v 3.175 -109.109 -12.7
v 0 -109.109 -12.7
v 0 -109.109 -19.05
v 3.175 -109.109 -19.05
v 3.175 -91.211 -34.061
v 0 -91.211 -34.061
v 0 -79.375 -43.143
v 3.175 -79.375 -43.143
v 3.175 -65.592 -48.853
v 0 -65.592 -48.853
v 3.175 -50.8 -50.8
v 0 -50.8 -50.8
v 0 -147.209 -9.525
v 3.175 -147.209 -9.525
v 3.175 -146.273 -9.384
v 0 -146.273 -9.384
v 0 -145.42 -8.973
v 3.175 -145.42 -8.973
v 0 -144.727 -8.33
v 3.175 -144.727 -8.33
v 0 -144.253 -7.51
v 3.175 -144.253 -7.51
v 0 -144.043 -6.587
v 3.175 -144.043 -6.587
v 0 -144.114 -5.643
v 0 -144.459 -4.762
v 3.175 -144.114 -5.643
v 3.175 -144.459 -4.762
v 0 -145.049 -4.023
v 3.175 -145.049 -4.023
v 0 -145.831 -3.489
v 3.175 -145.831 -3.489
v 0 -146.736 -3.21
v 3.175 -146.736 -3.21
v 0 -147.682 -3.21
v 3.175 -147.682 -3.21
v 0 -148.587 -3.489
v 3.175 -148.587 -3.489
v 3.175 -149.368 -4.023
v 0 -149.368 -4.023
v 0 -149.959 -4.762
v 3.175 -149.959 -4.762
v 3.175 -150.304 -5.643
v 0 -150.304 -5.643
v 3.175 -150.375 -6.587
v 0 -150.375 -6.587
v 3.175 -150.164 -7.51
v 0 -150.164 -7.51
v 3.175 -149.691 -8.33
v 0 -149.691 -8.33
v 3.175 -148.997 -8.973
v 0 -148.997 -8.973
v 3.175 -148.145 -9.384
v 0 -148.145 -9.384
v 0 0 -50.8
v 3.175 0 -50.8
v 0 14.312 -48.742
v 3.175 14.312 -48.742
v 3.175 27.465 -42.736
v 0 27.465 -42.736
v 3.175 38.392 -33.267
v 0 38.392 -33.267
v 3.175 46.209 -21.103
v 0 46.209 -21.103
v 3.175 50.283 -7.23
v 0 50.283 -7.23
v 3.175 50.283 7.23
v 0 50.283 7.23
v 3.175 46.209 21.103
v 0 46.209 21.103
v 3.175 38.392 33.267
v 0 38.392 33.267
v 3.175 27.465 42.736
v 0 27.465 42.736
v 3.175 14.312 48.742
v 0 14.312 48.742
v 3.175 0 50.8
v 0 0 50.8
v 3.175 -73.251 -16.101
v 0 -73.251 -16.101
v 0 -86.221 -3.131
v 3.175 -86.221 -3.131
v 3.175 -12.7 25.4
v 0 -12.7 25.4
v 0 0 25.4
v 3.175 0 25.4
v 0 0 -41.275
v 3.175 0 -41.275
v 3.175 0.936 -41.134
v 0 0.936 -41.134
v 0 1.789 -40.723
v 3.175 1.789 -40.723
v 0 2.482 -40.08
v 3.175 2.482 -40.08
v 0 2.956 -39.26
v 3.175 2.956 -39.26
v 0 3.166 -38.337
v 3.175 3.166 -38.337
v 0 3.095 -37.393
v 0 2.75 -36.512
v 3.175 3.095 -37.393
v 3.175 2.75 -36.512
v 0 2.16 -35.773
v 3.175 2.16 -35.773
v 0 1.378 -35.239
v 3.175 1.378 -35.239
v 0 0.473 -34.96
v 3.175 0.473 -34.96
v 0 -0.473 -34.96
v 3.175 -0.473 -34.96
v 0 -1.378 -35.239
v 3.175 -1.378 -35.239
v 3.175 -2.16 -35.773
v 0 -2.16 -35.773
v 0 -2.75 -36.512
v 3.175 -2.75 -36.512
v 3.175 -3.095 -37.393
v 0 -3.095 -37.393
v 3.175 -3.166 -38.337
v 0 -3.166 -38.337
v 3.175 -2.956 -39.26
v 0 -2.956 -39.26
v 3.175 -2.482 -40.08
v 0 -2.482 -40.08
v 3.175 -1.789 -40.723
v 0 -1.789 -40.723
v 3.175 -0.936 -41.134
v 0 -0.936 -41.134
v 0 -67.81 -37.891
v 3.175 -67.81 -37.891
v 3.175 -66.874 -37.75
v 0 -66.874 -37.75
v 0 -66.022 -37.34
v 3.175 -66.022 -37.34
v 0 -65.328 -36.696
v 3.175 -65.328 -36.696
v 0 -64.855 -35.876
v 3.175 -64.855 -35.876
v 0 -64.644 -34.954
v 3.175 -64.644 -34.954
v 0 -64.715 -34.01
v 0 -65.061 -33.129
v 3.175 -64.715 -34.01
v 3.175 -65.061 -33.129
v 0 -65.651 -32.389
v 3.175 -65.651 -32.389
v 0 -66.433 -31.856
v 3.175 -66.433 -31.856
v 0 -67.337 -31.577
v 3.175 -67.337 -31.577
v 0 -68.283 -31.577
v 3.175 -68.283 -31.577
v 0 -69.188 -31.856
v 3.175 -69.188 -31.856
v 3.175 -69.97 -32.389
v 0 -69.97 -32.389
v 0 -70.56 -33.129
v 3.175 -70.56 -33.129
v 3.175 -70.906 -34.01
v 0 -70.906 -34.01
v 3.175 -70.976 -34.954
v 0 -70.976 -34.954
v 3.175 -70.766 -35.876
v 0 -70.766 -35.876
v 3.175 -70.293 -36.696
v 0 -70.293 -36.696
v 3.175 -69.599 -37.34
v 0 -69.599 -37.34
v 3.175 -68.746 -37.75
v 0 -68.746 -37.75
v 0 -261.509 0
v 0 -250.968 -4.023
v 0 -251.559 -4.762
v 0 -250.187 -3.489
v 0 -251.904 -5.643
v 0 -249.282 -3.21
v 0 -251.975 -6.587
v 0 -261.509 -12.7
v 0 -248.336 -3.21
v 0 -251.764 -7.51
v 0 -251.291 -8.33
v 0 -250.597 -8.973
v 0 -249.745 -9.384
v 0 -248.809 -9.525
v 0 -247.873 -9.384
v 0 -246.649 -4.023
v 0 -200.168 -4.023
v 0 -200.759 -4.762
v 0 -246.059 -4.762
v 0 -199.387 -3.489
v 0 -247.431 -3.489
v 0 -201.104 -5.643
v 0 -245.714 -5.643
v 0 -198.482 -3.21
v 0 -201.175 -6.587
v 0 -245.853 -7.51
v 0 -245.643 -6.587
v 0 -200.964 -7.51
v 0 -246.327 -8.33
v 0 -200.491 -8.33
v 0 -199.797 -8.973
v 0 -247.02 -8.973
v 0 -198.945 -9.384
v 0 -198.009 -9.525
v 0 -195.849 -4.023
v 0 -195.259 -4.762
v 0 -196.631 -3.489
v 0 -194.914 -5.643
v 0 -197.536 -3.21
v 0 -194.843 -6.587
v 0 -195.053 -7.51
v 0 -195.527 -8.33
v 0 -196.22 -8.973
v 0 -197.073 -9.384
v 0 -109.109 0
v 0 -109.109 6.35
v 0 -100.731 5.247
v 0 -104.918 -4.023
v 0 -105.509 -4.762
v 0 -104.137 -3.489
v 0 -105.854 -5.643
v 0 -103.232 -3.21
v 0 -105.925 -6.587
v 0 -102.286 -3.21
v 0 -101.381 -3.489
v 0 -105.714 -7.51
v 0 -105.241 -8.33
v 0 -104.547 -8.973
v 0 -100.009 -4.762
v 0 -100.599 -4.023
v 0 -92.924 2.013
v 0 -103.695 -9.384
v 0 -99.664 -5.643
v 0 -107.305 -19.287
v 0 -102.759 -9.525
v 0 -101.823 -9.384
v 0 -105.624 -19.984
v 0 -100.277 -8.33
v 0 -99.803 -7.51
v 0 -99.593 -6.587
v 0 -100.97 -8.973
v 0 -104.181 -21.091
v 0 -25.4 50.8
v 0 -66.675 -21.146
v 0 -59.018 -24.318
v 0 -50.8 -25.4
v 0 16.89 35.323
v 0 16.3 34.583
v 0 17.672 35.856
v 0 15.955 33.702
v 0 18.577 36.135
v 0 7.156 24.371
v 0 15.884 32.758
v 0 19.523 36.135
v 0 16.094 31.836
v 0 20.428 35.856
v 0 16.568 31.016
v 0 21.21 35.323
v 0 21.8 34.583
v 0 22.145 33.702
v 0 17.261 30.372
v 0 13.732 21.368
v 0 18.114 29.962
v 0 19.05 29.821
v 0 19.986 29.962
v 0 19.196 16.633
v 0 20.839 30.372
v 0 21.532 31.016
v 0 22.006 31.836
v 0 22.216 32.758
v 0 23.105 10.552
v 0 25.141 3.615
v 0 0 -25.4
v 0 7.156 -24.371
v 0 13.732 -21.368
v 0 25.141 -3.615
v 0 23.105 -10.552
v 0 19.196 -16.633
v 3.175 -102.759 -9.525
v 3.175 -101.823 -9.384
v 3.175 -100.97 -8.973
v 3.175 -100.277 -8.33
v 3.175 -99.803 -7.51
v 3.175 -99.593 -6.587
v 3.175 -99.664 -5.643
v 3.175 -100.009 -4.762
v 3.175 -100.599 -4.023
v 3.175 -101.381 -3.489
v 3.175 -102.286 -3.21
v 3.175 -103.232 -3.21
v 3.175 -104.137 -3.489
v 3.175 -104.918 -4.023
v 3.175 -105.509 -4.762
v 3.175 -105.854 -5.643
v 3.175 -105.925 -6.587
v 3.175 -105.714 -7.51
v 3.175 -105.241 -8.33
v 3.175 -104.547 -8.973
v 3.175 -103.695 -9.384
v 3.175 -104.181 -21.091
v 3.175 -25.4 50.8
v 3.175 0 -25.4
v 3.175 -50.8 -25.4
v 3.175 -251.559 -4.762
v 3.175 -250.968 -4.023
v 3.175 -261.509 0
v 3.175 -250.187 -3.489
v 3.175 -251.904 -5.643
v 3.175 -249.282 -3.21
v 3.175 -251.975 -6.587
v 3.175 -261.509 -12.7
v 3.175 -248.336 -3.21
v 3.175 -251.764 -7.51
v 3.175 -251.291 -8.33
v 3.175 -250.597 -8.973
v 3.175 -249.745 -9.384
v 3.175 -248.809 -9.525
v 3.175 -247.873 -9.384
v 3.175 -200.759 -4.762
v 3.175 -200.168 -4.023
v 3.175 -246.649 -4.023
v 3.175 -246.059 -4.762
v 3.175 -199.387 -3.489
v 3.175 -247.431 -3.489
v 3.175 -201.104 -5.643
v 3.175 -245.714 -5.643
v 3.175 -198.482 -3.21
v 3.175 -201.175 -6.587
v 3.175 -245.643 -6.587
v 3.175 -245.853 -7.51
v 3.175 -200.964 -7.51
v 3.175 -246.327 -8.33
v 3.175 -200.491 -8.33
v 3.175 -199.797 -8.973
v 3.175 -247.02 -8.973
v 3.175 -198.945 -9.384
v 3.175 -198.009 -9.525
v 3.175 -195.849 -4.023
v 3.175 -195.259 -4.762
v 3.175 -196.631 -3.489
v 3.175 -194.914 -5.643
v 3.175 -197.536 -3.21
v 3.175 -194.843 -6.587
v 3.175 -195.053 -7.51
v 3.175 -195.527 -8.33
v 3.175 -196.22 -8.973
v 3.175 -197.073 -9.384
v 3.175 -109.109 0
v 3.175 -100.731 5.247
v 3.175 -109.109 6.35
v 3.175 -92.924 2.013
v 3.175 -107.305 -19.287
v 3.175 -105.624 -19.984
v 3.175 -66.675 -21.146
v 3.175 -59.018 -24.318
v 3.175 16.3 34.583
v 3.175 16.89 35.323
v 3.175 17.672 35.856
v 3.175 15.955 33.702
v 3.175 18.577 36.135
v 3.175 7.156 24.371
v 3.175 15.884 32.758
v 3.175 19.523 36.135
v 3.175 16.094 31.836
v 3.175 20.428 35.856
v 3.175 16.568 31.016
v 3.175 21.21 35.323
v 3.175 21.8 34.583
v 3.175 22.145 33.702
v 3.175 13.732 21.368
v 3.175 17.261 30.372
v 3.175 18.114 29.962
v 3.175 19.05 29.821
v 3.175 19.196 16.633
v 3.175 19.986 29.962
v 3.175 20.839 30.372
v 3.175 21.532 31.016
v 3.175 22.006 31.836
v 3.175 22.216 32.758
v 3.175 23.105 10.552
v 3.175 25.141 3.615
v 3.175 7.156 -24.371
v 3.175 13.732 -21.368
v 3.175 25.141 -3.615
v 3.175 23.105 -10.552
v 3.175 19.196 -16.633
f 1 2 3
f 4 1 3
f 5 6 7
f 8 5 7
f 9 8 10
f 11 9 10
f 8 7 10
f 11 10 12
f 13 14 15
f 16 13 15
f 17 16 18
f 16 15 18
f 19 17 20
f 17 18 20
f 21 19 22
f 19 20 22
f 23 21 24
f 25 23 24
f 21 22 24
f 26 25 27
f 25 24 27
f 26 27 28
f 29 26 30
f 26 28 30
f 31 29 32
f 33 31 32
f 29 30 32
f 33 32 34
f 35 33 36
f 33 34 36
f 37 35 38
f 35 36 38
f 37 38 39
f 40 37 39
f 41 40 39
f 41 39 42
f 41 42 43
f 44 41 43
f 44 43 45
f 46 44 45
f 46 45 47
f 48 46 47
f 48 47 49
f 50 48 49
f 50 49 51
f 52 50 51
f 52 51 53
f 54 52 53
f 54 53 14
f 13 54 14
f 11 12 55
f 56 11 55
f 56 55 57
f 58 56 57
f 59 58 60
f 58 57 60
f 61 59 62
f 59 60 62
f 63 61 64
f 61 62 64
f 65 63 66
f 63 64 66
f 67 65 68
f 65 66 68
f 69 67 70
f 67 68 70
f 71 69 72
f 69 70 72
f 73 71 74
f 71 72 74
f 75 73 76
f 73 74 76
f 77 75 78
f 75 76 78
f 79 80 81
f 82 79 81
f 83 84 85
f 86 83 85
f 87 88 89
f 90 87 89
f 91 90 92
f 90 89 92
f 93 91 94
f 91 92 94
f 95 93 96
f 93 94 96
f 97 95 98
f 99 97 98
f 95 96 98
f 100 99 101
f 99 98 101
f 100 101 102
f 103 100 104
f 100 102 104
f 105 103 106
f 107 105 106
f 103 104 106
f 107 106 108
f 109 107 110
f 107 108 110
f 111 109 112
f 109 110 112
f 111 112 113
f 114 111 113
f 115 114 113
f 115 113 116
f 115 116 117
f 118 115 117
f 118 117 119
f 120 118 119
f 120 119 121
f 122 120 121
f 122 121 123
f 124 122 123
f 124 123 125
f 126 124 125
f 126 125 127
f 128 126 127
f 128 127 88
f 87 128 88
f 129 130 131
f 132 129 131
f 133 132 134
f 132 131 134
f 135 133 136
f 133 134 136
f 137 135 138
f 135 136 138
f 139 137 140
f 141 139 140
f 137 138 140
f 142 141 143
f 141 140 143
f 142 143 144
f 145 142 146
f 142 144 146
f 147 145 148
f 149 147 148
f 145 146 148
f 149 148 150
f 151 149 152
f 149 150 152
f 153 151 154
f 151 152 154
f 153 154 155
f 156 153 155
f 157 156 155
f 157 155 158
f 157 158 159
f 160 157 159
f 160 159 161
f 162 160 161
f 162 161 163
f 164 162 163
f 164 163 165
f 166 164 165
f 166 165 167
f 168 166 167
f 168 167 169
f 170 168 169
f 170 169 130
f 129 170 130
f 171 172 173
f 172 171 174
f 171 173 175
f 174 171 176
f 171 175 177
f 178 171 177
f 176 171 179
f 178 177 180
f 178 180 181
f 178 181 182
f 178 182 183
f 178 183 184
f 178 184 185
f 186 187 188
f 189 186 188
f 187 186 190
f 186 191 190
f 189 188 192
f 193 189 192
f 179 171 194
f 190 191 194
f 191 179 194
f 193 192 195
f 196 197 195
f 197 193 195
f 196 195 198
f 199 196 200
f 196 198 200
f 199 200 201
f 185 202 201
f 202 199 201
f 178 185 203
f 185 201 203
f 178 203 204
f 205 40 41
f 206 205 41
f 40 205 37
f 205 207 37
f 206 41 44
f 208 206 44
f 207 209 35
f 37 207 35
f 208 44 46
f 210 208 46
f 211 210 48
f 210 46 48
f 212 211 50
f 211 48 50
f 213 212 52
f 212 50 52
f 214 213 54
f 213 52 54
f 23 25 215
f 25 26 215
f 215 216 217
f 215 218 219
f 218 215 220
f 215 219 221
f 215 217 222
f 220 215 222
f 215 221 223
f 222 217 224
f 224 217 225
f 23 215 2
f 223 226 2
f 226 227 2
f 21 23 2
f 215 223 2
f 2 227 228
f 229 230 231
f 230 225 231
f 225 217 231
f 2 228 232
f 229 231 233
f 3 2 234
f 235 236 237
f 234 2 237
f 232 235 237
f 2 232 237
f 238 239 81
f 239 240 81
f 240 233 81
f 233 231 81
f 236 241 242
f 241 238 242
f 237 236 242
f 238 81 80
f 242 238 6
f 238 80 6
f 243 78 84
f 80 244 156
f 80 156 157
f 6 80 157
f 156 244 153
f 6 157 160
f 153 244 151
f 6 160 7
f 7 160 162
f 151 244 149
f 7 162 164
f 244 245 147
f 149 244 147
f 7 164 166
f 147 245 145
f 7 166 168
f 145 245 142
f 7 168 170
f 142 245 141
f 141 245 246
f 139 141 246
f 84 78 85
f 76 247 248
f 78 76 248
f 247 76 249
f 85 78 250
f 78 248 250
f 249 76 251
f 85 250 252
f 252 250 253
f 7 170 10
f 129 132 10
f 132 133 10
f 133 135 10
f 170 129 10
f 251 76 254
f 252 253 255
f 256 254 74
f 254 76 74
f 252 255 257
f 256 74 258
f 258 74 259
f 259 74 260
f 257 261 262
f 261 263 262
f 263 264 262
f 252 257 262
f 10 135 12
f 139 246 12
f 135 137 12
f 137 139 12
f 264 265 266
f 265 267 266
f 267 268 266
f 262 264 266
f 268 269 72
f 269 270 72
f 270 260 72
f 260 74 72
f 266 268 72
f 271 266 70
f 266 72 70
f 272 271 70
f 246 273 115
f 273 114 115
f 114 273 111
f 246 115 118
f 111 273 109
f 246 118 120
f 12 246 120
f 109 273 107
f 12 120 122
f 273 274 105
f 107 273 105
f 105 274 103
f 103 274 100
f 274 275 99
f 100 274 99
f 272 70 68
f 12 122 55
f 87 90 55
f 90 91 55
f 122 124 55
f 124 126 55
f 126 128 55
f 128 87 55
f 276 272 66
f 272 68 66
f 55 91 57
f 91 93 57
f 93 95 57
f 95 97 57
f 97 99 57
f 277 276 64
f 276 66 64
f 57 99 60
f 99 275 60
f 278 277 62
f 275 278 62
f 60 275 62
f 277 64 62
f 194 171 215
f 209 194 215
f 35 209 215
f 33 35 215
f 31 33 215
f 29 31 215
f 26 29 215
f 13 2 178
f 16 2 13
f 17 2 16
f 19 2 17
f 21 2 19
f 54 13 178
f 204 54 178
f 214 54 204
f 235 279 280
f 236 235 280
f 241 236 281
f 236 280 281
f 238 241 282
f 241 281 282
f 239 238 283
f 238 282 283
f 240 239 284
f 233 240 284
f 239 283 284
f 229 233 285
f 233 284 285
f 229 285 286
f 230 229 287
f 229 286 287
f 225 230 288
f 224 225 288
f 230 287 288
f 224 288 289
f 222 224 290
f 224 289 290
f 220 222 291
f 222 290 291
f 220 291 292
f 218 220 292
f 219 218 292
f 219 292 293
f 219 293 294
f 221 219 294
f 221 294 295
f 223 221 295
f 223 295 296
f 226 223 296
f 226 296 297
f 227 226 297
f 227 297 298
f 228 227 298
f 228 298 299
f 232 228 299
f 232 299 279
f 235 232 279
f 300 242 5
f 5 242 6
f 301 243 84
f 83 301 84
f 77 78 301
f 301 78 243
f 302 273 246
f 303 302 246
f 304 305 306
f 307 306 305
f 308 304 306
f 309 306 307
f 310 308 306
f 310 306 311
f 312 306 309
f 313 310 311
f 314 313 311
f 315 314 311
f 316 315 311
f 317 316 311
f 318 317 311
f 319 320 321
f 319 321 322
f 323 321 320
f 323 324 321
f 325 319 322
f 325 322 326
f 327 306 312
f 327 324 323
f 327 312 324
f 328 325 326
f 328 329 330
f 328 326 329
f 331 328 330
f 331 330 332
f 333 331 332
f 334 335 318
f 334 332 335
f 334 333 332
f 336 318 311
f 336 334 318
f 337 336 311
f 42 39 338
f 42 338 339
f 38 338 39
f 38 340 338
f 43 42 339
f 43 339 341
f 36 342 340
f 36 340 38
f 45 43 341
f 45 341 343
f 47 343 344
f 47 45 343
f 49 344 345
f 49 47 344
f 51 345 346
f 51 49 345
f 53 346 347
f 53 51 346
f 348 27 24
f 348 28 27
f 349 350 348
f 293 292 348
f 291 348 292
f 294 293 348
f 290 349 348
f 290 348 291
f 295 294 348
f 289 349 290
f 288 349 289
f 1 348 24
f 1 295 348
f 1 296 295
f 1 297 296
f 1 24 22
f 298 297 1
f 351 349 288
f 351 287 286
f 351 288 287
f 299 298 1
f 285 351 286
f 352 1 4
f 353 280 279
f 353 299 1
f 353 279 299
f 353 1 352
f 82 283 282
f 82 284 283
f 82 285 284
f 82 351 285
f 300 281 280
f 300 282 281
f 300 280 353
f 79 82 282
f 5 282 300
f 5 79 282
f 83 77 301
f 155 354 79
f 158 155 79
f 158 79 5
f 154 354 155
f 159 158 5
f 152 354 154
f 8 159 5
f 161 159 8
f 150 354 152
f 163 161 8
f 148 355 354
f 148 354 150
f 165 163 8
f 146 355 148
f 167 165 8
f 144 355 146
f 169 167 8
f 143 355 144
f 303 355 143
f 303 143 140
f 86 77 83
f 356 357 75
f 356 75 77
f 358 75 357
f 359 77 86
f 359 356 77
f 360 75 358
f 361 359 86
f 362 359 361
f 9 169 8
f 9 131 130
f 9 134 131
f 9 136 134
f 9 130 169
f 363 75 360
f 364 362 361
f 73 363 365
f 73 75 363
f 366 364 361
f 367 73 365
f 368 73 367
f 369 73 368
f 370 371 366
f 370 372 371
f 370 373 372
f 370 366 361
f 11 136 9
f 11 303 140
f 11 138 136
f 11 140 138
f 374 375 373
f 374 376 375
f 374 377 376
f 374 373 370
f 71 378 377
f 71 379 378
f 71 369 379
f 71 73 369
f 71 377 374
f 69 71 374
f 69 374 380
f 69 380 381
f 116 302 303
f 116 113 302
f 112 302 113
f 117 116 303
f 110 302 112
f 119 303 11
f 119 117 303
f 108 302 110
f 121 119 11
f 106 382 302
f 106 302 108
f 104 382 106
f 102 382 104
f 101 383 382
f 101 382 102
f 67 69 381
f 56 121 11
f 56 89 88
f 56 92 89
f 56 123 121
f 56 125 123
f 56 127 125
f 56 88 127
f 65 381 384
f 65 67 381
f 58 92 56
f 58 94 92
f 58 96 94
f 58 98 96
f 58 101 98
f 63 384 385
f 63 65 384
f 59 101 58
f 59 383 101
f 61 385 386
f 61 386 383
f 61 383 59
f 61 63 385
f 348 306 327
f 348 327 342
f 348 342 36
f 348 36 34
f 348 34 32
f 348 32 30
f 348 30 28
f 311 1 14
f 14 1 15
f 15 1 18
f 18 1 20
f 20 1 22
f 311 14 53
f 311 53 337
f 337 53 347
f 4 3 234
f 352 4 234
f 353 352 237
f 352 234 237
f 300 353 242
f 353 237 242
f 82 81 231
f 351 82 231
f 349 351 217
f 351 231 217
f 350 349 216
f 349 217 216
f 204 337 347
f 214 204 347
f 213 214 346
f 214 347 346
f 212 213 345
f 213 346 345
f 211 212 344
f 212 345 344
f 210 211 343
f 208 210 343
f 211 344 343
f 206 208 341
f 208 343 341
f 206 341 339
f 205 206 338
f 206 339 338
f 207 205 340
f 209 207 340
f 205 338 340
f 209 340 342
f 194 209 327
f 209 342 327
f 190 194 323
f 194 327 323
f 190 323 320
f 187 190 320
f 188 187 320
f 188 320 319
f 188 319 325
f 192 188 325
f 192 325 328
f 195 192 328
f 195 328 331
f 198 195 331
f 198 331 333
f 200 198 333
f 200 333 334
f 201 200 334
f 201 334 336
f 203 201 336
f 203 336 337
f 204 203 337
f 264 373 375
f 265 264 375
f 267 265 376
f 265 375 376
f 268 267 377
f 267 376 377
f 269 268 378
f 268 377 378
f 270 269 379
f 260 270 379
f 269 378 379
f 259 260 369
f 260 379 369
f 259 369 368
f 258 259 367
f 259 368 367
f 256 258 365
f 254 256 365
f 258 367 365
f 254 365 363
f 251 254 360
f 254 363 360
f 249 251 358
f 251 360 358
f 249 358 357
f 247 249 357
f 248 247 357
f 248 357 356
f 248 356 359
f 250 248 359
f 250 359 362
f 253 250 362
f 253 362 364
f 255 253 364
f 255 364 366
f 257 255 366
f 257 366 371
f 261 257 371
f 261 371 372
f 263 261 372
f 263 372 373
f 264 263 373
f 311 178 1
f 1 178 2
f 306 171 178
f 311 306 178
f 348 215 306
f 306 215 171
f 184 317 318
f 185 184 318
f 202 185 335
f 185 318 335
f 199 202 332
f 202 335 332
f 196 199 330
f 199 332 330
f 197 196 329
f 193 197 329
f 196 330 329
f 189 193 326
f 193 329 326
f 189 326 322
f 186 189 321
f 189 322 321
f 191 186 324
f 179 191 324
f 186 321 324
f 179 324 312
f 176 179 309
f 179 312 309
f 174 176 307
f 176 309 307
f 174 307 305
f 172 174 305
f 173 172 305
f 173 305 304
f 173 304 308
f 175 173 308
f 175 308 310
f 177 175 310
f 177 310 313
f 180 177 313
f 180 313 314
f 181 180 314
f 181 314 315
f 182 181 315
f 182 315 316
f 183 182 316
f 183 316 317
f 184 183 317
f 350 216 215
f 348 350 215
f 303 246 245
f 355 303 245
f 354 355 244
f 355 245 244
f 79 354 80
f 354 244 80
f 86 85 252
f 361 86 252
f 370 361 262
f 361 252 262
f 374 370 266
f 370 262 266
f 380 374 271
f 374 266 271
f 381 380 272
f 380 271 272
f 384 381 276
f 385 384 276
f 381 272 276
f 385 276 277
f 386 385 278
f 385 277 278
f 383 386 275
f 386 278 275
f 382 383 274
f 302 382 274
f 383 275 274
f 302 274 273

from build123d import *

# Parameters (mm, degrees)
BOSS_EXTRUDE1_DEPTH = 3.175
SKETCH2_R           = 3.175
CUT_EXTRUDE1_DEPTH  = 4.175


with BuildPart() as part:
    # Sketch1 → Boss-Extrude1 (new body)
    with BuildSketch(Plane(origin=(0, 0, 0), x_dir=(0, 0, -1), z_dir=(1, 0, 0))):
        with BuildLine():
            Line((-50.8, 0), (-50.8, -25.4))
            Line((-50.8, -25.4), (-25.4, -12.7))
            Line((-25.4, -12.7), (-25.4, 0))
            ThreePointArc((-25.4, 0), (0, 25.4), (25.4, 0))
            Line((25.4, 0), (25.4, -50.8))
            ThreePointArc((25.4, -50.8), (22.983175157, -62.950198978), (16.100640303, -73.250640303))
            Line((16.100640303, -73.250640303), (3.130634922, -86.220645683))
            ThreePointArc((3.130634922, -86.220645683), (-3.886063261, -96.721876619), (-6.35, -109.108923092))
            Line((-6.35, -109.108923092), (0, -109.108923092))
            Line((0, -109.108923092), (0, -261.508923092))
            Line((0, -261.508923092), (12.7, -261.508923092))
            Line((12.7, -261.508923092), (12.7, -109.108923092))
            Line((12.7, -109.108923092), (19.05, -109.108923092))
            ThreePointArc((19.05, -109.108923092), (19.580476865, -106.442035801), (21.091147164, -104.181157925))
            Line((21.091147164, -104.181157925), (34.061152545, -91.211152545))
            ThreePointArc((34.061152545, -91.211152545), (46.449715283, -72.67035816), (50.8, -50.8))
            Line((50.8, -50.8), (50.8, 0))
            ThreePointArc((50.8, 0), (0, 50.8), (-50.8, 0))
        make_face()
    extrude(amount=BOSS_EXTRUDE1_DEPTH)

    # Sketch2 → Cut-Extrude1 (cut, through all)
    with BuildSketch(Plane(origin=(3.175, 0, 0), x_dir=(0, 0, -1), z_dir=(1, 0, 0))):
        with Locations((38.1, 0)):
            Circle(SKETCH2_R)
        with Locations((-32.995567884, 19.05)):
            Circle(SKETCH2_R)
        with Locations((34.71644522, -67.810278569)):
            Circle(SKETCH2_R)
        with Locations((6.35, -102.758923092)):
            Circle(SKETCH2_R)
        with Locations((6.35, -248.808923092)):
            Circle(SKETCH2_R)
        with Locations((6.35, -198.008923092)):
            Circle(SKETCH2_R)
        with Locations((6.35, -147.208923092)):
            Circle(SKETCH2_R)
    extrude(amount=-CUT_EXTRUDE1_DEPTH, mode=Mode.SUBTRACT)


solid = part.part
